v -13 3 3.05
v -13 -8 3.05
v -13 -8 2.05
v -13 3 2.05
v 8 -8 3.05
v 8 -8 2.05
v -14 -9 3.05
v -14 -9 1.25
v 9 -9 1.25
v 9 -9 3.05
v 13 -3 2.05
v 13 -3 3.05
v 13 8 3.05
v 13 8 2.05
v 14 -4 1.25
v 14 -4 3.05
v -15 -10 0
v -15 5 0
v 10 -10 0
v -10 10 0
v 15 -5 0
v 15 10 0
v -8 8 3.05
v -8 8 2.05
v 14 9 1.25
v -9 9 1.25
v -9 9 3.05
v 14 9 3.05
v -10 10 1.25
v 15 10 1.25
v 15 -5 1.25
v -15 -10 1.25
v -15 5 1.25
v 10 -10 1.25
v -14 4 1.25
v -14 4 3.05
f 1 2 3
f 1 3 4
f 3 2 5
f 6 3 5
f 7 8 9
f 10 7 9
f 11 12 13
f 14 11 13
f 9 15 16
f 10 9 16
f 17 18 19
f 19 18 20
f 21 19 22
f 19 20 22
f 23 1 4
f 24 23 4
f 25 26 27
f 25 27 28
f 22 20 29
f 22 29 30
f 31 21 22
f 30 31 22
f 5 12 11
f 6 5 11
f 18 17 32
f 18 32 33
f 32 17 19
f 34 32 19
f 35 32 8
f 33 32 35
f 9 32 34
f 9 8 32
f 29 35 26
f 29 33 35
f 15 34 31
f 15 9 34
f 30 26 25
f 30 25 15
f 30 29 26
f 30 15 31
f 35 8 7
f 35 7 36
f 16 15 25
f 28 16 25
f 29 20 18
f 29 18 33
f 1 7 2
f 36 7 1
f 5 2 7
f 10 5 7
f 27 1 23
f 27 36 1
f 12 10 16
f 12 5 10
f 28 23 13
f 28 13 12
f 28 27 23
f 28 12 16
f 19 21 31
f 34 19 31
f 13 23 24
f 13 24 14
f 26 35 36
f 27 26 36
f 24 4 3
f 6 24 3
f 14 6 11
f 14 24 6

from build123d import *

# Parameters (mm, degrees)
F0_W     = 30
F0_H     = 20
F1_DEPTH = 1.25
F2_W     = 28
F2_H     = 18
F3_DEPTH = 1.8
F4_W     = 26
F4_H     = 16
F5_DEPTH = 1
F6_SIZE  = 5
F7_SIZE  = 5


with BuildPart() as f1:
    # F0 (on Top) → F1 (new body)
    with BuildSketch(Plane.XY):
        Rectangle(F0_W, F0_H)
    extrude(amount=F1_DEPTH)

    # F2 (on face) → F3 (join)
    with BuildSketch(Plane.XY.offset(1.25)):
        Rectangle(F2_W, F2_H)
    extrude(amount=F3_DEPTH)

    # F4 (on face) → F5 (cut)
    with BuildSketch(Plane.XY.offset(3.05)):
        Rectangle(F4_W, F4_H)
    extrude(amount=-F5_DEPTH, mode=Mode.SUBTRACT)

    # F6
    f6_edges = [f1.edges().sort_by_distance(p)[0] for p in [
        (-13, 8, 2.55),
        (13, -8, 2.55),
        (-14, 9, 2.15),
        (14, -9, 2.15),
    ]]
    chamfer(f6_edges, length=F6_SIZE)

    # F7
    f7_edges = [f1.edges().sort_by_distance(p)[0] for p in [
        (15, -10, 0.625),
        (-15, 10, 0.625),
    ]]
    chamfer(f7_edges, length=F7_SIZE)


solid = f1.part
